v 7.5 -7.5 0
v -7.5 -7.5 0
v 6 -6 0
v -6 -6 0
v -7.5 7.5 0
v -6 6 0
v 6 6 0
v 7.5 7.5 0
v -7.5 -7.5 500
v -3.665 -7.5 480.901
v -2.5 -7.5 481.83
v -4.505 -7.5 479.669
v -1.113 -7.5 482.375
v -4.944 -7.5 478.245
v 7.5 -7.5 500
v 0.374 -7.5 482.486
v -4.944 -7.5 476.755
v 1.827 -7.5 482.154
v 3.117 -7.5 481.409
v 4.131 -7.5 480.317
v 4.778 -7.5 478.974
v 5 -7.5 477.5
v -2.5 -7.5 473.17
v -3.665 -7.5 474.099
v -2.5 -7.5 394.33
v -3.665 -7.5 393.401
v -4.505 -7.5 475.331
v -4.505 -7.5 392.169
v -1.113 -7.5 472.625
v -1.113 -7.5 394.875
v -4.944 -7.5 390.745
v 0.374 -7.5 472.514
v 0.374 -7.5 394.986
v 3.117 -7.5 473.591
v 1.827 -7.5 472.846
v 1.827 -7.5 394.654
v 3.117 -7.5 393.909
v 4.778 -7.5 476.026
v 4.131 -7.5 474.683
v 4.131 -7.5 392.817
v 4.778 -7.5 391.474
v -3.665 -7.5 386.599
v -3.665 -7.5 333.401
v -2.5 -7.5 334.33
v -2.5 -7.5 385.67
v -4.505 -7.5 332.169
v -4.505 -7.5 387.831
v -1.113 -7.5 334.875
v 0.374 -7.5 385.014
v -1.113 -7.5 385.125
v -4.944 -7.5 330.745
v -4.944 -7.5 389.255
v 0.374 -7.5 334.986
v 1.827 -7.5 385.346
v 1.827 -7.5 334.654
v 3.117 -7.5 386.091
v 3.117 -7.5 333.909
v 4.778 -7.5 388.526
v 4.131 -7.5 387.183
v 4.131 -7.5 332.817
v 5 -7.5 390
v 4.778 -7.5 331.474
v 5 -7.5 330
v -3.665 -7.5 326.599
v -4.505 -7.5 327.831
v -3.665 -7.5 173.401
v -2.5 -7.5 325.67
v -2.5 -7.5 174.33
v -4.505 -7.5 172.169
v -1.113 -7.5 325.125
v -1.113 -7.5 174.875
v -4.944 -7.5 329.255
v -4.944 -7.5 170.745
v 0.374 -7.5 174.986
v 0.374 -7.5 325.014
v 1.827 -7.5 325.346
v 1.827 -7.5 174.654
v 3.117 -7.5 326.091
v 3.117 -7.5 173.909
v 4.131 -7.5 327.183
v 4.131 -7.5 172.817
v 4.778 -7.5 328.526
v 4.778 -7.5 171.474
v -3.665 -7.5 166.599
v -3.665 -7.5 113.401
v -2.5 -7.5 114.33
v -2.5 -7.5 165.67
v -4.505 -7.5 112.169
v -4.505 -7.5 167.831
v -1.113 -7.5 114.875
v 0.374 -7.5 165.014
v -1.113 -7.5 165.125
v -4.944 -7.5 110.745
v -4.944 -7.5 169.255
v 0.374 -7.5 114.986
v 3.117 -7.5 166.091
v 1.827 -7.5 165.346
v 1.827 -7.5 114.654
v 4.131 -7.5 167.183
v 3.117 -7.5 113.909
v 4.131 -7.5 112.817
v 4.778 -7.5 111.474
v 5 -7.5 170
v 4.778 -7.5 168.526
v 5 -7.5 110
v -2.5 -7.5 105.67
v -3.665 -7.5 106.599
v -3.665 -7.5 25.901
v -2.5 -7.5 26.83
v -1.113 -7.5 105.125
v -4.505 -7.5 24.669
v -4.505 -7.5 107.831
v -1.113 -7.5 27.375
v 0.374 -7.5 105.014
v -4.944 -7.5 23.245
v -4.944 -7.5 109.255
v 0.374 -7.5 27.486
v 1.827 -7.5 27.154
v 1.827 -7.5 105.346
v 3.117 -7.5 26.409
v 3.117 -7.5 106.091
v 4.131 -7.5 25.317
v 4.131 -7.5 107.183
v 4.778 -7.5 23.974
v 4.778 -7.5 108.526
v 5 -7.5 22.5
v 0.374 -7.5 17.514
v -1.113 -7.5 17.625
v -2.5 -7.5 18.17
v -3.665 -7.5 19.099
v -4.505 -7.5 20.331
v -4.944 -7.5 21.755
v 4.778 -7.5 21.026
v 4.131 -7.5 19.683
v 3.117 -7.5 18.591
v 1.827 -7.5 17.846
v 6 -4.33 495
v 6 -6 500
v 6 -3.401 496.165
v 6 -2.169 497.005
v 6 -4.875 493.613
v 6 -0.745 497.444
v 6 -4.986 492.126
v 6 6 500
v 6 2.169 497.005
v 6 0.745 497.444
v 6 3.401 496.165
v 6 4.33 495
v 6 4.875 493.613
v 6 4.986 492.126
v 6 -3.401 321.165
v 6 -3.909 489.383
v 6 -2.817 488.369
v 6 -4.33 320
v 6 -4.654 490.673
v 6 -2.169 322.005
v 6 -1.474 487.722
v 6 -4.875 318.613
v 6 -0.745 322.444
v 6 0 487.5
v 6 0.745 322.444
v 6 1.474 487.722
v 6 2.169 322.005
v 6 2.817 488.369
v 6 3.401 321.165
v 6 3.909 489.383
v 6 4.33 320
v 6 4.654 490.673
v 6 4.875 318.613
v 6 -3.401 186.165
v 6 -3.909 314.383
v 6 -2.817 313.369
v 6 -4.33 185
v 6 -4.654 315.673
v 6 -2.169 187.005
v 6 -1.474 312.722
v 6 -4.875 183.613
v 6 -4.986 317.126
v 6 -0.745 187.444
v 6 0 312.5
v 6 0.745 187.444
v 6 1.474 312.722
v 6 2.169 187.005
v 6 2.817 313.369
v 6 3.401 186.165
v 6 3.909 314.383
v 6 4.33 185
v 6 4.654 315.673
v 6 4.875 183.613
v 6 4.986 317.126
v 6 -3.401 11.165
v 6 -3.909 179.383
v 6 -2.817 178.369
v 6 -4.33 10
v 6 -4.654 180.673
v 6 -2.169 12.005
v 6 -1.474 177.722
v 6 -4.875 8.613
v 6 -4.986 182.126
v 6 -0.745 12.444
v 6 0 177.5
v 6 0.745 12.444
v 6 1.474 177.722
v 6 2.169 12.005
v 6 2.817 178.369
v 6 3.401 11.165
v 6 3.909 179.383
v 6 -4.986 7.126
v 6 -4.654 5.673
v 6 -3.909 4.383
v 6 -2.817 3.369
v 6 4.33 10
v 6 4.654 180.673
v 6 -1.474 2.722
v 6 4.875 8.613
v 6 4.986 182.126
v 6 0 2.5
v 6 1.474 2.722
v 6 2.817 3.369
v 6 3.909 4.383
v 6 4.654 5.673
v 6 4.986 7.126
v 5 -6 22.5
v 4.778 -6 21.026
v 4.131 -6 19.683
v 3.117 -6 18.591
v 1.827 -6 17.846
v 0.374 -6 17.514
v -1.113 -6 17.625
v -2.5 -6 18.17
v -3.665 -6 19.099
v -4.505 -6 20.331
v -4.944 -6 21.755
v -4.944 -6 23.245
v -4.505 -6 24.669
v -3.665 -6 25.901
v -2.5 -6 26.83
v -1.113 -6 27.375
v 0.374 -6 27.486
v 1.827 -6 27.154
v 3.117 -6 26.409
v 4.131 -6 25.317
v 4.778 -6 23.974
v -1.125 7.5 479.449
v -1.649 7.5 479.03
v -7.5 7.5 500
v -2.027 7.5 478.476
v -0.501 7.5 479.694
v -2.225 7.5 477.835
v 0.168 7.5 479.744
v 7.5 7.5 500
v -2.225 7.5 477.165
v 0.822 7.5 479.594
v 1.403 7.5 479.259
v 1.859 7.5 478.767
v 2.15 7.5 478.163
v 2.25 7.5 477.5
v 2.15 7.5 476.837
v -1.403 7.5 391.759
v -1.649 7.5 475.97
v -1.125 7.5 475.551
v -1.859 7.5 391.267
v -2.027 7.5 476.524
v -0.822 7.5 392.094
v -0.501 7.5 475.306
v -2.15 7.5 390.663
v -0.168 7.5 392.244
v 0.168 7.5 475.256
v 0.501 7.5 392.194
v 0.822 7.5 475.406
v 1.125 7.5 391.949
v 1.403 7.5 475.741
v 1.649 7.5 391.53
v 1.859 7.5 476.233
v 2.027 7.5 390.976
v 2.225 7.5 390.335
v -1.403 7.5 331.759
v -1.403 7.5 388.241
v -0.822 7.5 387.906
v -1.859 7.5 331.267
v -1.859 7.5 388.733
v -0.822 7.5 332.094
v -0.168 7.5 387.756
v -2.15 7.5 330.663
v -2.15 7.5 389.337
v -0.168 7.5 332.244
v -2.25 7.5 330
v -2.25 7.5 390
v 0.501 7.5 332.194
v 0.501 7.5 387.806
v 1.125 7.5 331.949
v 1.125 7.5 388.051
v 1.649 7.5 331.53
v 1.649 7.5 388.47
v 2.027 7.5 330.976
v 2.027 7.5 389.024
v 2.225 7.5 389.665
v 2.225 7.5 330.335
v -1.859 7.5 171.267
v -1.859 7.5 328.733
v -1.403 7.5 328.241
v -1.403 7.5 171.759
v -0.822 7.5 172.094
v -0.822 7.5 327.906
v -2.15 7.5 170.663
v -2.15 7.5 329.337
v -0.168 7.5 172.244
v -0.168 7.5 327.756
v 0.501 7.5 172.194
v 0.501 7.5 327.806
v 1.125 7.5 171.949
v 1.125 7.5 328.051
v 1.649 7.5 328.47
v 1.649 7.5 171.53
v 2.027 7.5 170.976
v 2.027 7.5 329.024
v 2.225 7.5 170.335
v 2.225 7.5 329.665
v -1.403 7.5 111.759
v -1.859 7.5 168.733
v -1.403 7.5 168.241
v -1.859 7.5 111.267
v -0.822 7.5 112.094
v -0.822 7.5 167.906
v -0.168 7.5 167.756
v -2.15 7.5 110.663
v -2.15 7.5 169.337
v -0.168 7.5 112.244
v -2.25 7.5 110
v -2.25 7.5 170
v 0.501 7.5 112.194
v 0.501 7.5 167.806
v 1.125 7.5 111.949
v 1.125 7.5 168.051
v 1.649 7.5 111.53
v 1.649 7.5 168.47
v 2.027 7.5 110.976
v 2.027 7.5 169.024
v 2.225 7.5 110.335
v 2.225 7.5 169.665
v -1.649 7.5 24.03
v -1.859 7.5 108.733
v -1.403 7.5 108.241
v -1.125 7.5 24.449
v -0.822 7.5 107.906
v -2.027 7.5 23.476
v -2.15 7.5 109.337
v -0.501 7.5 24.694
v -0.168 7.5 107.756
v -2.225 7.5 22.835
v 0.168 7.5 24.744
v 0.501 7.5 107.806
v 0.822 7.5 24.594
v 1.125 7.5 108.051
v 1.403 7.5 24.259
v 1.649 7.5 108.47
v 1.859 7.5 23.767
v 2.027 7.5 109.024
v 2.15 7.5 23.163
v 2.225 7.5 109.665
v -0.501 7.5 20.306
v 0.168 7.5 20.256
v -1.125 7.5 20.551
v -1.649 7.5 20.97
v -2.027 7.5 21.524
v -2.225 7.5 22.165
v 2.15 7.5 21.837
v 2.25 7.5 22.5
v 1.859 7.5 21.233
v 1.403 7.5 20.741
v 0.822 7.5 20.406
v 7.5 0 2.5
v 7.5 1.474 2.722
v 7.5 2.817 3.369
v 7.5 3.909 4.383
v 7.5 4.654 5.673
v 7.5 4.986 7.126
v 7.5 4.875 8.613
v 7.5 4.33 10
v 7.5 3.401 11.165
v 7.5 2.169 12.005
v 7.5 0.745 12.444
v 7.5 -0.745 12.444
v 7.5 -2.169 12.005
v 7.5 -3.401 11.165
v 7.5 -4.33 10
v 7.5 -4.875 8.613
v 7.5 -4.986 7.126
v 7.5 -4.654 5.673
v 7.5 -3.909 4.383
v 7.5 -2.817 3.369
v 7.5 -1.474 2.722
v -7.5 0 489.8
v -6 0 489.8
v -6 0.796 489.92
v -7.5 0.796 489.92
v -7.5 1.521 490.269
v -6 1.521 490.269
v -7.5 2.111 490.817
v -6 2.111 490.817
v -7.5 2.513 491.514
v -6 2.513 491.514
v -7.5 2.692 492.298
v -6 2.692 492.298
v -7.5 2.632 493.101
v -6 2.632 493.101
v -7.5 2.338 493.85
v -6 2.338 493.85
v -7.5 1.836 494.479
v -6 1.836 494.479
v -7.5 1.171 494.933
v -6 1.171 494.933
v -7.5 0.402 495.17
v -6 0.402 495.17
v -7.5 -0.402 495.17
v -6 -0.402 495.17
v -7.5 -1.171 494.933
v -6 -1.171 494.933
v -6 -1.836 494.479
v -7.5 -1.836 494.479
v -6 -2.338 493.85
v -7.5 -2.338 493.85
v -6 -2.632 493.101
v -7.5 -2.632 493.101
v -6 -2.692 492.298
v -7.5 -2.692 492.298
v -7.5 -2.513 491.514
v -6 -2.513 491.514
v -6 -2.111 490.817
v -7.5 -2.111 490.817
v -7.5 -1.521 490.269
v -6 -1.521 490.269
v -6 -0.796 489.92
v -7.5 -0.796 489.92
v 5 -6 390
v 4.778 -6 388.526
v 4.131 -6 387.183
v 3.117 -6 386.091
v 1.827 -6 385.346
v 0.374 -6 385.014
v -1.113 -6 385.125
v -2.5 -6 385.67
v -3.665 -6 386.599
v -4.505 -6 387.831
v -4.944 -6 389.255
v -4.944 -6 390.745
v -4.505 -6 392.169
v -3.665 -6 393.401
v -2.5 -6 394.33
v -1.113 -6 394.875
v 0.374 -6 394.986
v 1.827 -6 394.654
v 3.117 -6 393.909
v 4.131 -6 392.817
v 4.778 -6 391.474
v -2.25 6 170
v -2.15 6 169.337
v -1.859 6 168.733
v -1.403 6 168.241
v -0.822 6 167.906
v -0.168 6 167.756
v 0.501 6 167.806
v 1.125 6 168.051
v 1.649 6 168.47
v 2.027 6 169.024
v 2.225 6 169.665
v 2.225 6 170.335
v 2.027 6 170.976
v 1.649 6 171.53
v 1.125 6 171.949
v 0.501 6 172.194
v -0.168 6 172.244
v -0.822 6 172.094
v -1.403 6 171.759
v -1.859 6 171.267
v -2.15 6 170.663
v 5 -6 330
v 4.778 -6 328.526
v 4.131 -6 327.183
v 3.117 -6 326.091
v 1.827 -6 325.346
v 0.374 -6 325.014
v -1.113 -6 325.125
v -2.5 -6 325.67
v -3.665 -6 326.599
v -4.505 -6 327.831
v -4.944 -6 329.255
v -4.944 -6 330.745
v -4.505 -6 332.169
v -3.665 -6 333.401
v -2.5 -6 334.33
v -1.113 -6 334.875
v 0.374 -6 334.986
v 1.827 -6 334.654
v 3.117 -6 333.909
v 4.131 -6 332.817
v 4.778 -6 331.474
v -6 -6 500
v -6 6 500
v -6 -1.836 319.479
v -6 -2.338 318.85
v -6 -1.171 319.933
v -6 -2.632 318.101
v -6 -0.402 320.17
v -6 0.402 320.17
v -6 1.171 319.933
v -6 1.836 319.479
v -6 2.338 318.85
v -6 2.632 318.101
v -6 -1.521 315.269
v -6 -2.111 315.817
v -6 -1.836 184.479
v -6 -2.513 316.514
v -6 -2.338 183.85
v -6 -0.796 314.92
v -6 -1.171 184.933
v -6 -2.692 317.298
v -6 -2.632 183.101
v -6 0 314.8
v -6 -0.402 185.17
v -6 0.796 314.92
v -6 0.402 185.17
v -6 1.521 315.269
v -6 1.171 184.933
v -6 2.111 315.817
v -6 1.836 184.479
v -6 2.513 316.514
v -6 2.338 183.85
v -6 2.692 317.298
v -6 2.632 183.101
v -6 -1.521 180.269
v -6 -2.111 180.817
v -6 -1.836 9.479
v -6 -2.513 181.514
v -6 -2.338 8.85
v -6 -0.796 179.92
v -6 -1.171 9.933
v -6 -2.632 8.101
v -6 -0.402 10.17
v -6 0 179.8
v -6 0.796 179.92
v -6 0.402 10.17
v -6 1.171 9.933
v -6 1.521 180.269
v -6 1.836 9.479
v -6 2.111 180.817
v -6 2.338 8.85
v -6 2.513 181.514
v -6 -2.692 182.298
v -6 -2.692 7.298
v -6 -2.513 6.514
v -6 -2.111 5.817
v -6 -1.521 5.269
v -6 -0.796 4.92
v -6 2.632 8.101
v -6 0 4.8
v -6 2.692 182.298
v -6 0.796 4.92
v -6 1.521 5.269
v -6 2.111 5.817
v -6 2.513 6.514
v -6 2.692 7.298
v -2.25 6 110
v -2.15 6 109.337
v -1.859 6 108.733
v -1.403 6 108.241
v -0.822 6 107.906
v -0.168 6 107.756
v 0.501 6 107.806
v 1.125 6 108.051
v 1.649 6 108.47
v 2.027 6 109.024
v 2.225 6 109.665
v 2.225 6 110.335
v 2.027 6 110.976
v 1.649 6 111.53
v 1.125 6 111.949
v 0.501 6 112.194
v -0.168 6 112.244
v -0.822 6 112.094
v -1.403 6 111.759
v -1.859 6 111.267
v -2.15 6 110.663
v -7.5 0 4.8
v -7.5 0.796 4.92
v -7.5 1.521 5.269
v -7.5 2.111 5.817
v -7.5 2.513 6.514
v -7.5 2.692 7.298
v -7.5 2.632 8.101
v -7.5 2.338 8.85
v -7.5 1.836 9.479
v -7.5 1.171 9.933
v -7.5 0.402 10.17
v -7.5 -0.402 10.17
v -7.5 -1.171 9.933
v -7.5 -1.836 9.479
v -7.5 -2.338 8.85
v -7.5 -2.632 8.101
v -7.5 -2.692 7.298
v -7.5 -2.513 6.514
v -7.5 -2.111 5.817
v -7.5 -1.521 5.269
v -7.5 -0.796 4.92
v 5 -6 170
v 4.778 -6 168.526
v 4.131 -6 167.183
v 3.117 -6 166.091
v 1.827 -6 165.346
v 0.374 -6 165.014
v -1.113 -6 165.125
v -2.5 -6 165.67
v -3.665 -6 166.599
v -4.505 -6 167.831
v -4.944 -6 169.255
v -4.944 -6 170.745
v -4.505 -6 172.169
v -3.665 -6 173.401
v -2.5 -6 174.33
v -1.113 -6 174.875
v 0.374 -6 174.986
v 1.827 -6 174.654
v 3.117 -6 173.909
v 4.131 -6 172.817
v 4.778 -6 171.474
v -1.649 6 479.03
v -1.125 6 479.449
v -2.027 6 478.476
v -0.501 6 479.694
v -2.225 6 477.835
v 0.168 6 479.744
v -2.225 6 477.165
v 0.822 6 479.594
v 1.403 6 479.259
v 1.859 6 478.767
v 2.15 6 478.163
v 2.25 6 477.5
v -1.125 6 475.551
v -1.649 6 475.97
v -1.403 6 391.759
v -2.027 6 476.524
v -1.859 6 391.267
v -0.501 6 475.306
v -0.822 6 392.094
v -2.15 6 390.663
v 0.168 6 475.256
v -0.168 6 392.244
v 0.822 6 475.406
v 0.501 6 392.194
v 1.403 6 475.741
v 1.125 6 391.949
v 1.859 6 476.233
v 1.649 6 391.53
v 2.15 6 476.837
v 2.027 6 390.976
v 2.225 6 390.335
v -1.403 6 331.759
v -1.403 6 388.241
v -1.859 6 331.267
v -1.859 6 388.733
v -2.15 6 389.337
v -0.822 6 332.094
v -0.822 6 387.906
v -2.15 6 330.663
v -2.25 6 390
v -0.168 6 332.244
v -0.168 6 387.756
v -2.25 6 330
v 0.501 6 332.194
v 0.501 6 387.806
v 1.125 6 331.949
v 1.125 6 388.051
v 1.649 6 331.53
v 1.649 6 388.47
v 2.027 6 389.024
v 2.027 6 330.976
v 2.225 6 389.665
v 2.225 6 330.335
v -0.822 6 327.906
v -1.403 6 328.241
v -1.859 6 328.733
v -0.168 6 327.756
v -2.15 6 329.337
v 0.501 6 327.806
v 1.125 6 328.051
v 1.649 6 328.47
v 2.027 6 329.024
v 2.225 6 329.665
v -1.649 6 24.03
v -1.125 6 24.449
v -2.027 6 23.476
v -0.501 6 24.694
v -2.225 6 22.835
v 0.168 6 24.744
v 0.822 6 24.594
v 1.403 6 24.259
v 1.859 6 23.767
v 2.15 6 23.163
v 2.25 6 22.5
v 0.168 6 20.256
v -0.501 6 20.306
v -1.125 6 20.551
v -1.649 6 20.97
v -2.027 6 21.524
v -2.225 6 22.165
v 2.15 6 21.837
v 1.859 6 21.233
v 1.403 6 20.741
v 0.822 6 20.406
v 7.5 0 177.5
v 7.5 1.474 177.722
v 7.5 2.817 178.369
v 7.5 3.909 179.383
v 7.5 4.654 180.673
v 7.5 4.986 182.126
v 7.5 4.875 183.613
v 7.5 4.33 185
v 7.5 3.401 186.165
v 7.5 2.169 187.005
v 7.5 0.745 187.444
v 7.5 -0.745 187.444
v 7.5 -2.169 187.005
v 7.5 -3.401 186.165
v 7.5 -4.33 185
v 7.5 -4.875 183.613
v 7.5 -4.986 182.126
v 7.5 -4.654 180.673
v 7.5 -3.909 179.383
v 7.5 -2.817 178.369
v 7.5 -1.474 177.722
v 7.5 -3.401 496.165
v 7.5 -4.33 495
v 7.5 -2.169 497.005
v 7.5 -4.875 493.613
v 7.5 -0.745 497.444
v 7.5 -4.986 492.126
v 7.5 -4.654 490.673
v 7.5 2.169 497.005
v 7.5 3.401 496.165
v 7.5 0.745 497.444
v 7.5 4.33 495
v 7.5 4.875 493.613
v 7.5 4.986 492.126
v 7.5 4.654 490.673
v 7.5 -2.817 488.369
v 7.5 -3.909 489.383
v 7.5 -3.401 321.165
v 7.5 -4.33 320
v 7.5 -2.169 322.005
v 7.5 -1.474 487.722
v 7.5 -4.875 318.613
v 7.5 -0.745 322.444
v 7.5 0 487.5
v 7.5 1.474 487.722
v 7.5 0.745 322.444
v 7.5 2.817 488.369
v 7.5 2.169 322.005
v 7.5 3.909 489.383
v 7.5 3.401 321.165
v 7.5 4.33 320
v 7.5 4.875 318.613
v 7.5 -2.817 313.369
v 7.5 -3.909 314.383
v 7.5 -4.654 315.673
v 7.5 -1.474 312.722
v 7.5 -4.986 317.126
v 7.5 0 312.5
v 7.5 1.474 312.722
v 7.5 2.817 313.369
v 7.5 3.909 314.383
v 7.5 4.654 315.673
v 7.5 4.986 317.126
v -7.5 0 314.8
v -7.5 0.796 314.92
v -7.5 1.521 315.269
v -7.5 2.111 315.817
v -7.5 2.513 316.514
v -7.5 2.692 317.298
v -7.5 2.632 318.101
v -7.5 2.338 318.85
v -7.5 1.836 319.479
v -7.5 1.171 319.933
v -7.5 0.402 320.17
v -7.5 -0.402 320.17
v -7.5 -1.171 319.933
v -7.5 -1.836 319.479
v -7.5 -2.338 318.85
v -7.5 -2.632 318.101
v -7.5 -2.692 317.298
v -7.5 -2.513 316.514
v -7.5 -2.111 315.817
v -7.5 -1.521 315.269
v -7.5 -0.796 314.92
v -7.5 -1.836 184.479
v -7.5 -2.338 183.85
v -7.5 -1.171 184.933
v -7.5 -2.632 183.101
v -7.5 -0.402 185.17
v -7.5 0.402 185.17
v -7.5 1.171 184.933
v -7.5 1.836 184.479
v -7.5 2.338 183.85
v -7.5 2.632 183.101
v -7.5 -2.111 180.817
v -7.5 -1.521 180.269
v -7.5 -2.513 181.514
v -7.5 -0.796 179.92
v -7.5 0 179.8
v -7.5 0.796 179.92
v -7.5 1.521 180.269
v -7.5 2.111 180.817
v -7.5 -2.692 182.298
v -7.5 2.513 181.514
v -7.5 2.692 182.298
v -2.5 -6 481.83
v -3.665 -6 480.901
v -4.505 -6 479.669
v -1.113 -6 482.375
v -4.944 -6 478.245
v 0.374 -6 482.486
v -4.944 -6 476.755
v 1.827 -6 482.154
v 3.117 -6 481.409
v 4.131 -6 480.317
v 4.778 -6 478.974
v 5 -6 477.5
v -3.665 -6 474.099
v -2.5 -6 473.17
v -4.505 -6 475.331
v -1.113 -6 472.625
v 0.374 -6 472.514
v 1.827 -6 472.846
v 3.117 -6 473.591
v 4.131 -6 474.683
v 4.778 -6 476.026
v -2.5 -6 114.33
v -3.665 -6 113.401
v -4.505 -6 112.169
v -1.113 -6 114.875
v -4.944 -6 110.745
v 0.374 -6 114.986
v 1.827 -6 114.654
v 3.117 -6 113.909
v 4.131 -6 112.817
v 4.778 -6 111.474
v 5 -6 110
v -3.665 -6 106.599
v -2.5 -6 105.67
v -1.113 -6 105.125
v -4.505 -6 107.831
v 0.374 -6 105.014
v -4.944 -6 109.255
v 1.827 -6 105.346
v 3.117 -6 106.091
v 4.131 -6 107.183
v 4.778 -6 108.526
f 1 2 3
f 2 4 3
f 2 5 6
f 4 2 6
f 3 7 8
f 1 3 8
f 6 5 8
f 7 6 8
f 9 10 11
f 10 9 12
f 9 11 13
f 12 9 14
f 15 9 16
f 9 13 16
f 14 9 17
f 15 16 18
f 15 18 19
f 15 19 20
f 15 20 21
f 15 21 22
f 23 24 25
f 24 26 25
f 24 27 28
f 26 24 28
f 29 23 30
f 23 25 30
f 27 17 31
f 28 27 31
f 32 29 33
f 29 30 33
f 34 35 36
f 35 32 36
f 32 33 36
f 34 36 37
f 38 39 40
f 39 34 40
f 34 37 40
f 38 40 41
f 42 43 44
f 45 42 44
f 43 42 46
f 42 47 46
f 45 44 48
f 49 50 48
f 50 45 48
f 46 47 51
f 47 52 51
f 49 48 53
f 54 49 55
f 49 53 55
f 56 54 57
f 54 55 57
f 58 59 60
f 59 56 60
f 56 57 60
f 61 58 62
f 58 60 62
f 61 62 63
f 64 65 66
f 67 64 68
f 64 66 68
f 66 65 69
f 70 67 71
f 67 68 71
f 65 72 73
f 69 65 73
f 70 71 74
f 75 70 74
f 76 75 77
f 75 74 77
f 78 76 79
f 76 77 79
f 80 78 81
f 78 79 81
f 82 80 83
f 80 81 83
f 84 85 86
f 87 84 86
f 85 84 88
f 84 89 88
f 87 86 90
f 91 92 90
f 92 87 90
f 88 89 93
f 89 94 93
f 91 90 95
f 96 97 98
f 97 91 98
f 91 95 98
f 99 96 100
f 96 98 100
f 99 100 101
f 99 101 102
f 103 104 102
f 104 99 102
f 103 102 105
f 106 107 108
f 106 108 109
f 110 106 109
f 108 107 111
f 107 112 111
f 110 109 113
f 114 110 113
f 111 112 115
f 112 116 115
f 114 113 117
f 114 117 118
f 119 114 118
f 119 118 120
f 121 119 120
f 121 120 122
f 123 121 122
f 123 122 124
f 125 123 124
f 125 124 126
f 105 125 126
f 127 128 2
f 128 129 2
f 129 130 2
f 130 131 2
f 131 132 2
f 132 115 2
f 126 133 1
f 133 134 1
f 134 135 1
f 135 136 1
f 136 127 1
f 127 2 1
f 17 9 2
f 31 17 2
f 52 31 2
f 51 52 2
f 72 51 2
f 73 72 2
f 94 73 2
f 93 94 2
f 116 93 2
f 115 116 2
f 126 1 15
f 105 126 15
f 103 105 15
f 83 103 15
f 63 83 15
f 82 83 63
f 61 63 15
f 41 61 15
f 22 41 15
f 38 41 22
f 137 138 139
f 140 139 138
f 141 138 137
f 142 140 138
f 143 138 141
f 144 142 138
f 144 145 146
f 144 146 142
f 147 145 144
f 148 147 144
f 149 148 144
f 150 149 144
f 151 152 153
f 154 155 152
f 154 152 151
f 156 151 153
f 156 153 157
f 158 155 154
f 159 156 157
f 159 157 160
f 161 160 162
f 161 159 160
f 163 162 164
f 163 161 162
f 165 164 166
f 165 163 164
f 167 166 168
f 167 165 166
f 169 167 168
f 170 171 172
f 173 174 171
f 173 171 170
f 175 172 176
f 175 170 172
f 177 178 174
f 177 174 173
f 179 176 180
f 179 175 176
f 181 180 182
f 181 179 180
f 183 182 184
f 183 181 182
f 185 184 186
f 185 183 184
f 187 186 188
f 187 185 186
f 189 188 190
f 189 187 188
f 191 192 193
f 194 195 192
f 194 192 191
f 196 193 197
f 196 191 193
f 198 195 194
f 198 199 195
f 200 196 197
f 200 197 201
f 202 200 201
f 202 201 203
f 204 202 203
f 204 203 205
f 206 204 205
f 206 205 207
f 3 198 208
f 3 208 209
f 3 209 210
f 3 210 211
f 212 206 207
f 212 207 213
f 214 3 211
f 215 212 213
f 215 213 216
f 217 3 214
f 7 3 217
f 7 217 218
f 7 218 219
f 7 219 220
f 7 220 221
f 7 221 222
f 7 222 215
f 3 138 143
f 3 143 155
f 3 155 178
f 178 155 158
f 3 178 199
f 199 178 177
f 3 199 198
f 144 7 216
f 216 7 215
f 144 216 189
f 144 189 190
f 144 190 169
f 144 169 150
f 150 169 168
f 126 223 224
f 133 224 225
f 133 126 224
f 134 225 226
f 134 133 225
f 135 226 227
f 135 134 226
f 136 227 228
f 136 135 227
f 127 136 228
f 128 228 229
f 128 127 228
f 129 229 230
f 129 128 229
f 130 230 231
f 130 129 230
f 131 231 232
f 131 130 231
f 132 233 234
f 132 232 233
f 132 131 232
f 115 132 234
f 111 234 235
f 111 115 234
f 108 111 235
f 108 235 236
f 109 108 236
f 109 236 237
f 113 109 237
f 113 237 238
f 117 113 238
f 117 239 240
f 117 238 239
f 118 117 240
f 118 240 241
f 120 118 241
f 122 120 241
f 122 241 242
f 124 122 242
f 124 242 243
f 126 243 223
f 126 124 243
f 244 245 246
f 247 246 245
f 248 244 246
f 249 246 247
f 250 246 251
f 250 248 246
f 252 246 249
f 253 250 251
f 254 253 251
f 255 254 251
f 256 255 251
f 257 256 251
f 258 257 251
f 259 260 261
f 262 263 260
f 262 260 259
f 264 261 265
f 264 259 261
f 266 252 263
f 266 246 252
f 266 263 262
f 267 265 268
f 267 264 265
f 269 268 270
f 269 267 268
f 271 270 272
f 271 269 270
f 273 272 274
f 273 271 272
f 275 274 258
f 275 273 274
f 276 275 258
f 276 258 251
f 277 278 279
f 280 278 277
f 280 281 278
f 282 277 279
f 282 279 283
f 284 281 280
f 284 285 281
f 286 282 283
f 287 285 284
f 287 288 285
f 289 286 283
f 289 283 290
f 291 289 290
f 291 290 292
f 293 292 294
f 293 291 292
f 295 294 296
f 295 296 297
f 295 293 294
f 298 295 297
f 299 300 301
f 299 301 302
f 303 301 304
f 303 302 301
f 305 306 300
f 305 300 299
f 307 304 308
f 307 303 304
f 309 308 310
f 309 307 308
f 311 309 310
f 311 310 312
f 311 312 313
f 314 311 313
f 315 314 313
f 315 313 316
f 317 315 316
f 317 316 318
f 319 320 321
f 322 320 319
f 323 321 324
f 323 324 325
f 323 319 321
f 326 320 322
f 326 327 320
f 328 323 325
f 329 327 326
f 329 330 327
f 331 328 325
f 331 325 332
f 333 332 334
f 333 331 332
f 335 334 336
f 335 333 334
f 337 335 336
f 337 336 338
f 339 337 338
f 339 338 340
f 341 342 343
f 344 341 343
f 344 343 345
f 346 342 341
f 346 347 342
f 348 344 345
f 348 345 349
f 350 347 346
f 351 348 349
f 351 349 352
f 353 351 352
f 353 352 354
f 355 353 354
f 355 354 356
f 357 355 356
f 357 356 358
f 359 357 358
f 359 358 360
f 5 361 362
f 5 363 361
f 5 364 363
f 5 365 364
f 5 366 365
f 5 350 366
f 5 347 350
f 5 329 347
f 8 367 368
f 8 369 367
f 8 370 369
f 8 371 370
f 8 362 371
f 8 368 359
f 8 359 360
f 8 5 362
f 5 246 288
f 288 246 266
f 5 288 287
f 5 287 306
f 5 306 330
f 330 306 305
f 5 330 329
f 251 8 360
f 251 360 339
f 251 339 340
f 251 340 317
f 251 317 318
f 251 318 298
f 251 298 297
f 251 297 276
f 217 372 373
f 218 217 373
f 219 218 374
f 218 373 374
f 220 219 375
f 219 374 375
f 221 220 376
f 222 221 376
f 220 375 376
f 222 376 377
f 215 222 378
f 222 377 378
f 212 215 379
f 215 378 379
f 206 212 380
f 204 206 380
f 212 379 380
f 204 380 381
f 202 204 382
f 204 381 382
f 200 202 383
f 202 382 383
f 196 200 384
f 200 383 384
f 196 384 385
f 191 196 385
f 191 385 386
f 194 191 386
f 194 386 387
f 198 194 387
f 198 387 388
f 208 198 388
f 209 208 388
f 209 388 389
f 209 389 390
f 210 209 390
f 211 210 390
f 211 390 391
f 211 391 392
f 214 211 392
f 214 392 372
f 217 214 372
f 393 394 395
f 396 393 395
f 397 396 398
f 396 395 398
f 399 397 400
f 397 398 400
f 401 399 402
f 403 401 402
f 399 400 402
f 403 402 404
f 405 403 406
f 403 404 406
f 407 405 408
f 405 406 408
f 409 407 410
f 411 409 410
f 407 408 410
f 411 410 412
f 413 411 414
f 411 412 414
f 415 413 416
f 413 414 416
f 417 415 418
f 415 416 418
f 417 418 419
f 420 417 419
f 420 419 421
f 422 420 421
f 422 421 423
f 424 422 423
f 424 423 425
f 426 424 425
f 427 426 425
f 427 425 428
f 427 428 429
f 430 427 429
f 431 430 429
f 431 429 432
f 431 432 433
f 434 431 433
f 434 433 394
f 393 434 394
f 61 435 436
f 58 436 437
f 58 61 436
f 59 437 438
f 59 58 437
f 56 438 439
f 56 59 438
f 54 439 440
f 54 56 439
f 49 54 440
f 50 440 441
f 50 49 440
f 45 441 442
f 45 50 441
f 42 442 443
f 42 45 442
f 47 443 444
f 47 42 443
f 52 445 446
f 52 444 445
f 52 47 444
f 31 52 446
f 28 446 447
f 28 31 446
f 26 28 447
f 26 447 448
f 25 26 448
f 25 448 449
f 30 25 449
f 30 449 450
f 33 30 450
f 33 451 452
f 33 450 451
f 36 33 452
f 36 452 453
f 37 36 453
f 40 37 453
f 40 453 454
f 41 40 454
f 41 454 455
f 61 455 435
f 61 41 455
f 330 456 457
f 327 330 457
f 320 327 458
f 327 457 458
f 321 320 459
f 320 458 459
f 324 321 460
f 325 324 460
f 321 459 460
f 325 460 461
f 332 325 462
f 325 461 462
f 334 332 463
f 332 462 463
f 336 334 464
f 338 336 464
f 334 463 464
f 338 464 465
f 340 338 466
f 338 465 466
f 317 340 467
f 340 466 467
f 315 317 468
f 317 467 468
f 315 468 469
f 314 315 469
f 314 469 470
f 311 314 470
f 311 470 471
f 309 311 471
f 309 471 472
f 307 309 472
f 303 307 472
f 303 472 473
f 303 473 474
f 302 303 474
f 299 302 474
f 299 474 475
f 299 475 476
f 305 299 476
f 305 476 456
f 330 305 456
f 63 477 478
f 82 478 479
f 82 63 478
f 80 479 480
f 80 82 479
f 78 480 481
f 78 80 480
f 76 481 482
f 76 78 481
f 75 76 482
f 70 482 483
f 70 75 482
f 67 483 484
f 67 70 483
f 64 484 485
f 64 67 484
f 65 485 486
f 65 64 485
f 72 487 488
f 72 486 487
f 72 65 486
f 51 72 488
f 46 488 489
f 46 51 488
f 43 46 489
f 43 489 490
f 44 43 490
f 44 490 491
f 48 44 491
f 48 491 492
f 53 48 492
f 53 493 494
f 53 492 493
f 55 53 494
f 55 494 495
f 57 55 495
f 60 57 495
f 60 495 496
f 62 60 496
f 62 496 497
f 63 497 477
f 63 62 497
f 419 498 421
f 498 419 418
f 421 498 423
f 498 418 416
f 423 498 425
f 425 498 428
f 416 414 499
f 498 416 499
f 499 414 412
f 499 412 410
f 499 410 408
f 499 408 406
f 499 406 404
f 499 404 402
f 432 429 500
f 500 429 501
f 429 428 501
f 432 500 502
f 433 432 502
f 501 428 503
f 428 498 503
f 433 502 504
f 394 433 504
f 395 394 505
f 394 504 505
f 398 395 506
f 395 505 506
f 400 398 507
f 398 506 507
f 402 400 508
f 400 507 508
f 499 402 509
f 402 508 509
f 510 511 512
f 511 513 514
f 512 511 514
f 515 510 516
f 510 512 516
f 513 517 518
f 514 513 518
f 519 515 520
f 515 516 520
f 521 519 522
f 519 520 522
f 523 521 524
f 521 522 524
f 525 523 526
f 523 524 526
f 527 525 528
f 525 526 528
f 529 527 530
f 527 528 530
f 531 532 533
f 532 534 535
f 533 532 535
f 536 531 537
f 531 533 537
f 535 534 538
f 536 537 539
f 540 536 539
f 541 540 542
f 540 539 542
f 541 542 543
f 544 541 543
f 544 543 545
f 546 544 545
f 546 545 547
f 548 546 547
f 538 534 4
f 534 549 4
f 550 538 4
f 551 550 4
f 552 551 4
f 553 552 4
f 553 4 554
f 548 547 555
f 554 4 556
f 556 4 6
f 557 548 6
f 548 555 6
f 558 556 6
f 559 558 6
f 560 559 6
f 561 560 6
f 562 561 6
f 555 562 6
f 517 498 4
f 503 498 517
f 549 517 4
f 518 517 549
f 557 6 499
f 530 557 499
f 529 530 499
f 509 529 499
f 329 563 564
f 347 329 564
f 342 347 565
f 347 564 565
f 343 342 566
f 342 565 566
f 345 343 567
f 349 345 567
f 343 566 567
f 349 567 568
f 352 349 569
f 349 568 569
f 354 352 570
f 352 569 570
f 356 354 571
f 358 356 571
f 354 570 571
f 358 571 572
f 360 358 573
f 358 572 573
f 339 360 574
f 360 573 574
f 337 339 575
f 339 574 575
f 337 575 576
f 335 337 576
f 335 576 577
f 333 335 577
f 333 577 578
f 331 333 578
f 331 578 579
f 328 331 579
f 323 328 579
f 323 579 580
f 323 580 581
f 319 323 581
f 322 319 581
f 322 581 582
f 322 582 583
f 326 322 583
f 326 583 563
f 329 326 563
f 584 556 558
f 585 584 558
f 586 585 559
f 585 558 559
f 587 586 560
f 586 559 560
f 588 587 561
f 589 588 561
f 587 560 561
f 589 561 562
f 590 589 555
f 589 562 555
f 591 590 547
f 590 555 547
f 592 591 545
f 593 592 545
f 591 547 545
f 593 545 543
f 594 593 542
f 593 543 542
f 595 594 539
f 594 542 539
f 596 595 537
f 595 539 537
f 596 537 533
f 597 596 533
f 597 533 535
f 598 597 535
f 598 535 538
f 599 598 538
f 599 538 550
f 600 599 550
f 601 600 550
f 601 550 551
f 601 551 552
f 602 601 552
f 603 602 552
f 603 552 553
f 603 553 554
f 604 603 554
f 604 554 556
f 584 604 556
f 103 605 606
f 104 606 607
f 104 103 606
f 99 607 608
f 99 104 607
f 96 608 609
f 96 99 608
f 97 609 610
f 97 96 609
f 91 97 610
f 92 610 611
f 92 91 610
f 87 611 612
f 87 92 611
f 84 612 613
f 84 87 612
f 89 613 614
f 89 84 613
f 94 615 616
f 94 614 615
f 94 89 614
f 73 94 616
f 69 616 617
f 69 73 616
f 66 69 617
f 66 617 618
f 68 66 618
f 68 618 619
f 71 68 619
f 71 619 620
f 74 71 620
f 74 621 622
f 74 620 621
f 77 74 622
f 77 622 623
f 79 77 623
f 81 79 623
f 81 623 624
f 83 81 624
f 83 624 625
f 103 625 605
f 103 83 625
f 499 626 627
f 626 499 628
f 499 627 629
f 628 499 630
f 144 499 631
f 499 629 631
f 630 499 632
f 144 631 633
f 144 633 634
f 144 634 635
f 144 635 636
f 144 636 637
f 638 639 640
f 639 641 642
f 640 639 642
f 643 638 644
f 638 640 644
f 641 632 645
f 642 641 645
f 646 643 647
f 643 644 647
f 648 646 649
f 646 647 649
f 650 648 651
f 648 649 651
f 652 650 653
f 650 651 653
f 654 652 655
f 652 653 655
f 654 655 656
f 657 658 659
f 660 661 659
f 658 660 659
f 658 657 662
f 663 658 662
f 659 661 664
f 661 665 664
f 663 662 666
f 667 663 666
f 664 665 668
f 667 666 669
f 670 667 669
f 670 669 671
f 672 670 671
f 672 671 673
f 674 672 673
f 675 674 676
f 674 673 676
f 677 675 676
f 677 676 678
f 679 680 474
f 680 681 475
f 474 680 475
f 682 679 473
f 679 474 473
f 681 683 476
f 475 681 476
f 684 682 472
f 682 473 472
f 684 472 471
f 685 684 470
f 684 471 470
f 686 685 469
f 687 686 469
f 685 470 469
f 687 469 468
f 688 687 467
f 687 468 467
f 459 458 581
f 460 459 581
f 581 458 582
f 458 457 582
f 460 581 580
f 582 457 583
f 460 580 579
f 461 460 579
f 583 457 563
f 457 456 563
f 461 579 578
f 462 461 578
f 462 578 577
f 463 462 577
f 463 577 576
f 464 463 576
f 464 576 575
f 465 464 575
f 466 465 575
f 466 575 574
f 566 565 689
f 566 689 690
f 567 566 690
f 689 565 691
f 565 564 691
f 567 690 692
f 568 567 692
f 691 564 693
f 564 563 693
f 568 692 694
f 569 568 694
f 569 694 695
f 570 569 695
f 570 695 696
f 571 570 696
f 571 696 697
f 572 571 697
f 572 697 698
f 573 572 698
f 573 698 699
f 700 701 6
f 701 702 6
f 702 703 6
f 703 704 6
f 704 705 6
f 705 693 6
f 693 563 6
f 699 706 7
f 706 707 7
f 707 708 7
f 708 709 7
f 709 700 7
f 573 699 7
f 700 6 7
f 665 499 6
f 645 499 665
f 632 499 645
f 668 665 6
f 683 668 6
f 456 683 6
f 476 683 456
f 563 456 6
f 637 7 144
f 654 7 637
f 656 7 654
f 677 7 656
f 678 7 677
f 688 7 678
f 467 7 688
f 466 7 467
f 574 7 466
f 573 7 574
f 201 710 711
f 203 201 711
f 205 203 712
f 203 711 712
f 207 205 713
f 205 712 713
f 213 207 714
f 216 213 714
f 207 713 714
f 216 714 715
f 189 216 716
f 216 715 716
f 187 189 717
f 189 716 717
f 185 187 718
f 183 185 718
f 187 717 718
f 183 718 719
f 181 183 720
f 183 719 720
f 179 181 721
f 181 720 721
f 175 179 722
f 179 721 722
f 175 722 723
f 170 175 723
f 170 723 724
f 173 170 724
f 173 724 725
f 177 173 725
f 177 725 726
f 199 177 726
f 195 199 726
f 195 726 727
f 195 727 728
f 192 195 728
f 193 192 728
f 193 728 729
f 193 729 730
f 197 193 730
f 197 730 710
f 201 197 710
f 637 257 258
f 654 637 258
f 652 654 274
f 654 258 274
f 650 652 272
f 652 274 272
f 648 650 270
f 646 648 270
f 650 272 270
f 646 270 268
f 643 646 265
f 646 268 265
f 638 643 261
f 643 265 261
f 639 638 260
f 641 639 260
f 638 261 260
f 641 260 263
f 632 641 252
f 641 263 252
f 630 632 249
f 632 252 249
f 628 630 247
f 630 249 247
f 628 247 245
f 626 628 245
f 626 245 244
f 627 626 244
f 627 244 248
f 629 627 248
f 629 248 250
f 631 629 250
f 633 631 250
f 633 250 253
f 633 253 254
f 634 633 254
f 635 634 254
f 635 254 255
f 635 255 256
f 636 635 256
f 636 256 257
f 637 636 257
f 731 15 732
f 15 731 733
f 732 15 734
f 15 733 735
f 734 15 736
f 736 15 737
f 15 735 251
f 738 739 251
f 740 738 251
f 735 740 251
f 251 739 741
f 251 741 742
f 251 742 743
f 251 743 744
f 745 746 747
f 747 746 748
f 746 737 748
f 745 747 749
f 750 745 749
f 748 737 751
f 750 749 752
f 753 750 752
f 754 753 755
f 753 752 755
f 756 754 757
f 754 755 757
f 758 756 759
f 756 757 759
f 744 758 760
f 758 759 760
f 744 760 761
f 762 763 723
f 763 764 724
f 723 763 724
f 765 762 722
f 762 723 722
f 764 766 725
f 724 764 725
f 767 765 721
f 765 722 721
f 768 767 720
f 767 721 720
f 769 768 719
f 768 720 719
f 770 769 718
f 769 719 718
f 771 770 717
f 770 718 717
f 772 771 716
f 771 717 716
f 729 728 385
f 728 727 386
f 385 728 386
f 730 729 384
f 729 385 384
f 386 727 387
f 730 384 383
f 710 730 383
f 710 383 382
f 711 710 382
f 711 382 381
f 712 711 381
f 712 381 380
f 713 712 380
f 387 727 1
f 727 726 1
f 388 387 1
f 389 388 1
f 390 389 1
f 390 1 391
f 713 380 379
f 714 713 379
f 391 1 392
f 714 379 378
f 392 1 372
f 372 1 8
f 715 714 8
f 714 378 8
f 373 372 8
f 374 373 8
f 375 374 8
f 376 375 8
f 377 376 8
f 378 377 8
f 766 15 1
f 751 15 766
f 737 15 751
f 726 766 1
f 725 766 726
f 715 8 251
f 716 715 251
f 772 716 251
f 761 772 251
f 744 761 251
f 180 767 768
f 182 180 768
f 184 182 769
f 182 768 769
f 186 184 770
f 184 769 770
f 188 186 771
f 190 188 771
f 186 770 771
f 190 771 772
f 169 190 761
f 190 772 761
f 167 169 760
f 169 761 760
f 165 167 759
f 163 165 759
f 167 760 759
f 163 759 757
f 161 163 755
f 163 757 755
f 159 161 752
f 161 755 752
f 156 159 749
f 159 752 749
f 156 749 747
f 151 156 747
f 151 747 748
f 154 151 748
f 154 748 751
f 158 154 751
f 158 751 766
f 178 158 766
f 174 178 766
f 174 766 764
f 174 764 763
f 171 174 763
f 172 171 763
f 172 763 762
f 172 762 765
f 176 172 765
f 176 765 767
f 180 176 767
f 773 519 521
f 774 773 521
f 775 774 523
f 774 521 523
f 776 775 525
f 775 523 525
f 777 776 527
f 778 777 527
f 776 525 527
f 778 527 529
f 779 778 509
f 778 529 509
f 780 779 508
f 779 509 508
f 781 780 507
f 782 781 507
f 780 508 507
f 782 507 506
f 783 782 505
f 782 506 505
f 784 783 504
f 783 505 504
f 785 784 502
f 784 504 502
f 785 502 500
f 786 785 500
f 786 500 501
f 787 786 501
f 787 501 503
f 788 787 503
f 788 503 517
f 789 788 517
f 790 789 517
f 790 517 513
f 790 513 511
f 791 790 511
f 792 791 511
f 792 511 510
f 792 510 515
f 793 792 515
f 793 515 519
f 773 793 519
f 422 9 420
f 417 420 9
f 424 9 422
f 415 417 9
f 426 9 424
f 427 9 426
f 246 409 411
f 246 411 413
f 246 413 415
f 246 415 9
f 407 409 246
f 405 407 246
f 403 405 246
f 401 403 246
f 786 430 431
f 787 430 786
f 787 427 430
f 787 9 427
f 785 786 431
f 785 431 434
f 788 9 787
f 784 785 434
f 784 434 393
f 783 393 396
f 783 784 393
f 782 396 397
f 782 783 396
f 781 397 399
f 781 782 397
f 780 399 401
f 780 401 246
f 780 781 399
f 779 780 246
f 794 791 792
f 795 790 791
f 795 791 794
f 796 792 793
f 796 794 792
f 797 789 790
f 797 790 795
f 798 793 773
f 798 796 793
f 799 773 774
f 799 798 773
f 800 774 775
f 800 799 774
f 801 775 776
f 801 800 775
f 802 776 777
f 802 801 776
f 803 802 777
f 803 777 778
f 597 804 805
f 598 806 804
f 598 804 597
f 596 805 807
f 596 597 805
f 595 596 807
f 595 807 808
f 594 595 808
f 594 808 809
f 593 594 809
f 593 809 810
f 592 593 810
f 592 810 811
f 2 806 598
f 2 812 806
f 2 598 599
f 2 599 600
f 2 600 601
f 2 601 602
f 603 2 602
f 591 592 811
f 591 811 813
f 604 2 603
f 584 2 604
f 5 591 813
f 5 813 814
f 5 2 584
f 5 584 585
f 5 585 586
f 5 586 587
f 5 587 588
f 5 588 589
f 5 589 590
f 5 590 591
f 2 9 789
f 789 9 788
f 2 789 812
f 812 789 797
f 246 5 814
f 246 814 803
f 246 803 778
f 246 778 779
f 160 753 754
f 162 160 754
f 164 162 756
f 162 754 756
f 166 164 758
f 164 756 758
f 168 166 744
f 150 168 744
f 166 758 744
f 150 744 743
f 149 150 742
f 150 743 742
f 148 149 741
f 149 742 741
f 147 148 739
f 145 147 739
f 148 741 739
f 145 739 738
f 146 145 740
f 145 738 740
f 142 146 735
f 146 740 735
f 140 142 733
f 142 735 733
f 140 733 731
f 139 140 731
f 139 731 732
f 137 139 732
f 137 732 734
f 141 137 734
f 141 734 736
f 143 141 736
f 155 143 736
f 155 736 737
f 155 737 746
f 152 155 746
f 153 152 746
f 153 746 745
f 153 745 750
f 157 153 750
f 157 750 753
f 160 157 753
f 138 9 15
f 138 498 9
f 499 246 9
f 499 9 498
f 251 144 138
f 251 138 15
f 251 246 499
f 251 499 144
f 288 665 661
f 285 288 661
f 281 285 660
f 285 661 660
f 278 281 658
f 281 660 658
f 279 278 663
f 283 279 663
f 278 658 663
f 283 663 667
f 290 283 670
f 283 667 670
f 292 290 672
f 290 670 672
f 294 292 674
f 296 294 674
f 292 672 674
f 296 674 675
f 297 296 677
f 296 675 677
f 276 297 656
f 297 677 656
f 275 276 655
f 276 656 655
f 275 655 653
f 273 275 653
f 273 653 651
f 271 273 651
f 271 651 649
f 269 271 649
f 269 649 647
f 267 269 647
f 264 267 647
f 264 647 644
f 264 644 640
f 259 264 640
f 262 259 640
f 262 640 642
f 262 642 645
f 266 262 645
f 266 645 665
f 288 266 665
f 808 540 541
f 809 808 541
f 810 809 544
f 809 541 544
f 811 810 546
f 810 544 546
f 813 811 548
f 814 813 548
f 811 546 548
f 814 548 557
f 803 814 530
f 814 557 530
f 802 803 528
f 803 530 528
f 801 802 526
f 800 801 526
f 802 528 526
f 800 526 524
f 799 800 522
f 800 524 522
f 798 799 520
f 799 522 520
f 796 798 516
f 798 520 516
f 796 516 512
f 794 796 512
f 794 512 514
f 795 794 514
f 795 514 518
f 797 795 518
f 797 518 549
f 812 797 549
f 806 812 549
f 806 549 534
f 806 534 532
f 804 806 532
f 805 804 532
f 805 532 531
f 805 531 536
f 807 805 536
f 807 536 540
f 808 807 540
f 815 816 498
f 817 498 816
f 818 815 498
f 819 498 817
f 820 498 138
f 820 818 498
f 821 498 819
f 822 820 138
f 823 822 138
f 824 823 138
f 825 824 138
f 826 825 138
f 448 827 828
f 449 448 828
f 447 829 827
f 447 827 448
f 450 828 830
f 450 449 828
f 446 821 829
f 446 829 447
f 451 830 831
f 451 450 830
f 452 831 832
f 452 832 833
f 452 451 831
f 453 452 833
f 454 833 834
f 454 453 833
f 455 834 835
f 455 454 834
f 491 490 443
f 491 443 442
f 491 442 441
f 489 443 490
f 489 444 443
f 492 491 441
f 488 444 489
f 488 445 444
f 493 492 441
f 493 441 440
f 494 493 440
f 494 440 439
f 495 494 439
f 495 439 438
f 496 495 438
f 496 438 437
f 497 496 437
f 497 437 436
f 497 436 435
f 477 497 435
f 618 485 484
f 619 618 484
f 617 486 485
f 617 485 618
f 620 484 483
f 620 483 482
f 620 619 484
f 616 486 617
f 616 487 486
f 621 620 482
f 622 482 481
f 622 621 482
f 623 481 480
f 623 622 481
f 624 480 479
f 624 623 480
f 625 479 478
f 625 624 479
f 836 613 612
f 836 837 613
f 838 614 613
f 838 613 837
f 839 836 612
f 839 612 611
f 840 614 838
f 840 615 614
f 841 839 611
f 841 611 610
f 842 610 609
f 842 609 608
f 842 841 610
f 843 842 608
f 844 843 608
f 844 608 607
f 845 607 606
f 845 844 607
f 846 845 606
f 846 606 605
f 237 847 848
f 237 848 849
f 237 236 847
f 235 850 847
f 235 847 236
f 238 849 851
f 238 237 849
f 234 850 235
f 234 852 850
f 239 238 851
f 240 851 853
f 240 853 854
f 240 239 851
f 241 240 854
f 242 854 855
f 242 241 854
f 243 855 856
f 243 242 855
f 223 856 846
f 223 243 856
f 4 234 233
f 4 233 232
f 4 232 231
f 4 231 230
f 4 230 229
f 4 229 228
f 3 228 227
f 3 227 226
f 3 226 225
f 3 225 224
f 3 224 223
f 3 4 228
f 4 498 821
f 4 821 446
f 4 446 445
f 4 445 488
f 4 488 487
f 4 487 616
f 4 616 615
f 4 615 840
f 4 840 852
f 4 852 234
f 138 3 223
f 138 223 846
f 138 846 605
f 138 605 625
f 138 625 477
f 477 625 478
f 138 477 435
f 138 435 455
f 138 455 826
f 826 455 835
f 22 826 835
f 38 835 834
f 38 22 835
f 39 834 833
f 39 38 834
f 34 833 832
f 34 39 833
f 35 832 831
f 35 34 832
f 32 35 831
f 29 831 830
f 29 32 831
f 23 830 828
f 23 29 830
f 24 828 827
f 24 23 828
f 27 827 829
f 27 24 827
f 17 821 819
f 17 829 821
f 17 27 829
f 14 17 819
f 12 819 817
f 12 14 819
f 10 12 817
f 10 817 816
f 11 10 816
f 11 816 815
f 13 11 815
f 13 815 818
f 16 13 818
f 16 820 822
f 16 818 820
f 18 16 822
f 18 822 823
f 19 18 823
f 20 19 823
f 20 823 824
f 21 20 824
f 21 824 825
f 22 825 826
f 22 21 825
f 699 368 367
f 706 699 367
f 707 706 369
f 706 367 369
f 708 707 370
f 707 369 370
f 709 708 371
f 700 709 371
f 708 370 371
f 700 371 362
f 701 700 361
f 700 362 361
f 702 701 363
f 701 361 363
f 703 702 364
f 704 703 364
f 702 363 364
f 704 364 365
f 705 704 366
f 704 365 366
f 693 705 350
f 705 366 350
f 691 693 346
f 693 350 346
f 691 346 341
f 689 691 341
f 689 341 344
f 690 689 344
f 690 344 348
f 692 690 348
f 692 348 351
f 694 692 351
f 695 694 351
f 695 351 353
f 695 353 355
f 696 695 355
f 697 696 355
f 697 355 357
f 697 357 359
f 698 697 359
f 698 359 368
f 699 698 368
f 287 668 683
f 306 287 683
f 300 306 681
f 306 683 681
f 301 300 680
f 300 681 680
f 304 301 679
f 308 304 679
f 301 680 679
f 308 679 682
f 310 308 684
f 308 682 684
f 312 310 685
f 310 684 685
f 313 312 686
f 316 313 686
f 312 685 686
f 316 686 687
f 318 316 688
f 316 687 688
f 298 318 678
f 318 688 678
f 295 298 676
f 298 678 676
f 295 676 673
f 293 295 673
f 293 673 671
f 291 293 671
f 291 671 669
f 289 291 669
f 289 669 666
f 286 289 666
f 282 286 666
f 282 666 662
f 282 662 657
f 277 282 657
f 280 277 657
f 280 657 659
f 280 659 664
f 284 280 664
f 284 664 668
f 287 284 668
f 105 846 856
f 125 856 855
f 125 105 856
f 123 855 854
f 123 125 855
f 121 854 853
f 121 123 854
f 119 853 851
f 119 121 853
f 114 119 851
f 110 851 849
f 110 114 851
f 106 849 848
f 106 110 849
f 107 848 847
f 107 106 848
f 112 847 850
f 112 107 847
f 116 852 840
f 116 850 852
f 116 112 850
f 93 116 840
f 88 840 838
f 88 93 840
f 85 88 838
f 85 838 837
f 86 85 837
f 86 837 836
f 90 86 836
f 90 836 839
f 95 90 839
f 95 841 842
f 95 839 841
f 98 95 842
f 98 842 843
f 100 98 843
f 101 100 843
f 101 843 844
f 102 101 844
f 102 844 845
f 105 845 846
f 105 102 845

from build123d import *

# Parameters (mm, degrees)
SKETCH_1_W          = 15
SKETCH_1_H          = 15
SKETCH_1_W_2        = 12
SKETCH_1_H_2        = 12
EXTRUDE_1_DEPTH     = 500
SKETCH_2_R          = 2.7
CUT_EXTRUDE_1_DEPTH = 25
SKETCH_3_R          = 2.25
CUT_EXTRUDE_2_DEPTH = 25
SKETCH_4_R          = 2.25
CUT_EXTRUDE_3_DEPTH = 20
SKETCH_5_R          = 5
CUT_EXTRUDE_4_DEPTH = 10
SKETCH_6_R          = 5
CUT_EXTRUDE_5_DEPTH = 10


with BuildPart() as part:
    # ｽｹｯﾁ1 → ﾎﾞｽ - 押し出し1 (new body)
    with BuildSketch(Plane.XY):
        Rectangle(SKETCH_1_W, SKETCH_1_H)
        Rectangle(SKETCH_1_W_2, SKETCH_1_H_2, mode=Mode.SUBTRACT)
    extrude(amount=EXTRUDE_1_DEPTH)

    # ｽｹｯﾁ2 → ｶｯﾄ - 押し出し1 (cut)
    with BuildSketch(Plane(origin=(7.5, 0, 0), x_dir=(0, 0, -1), z_dir=(1, 0, 0))):
        with Locations((-492.5, 0)):
            Circle(SKETCH_2_R)
        with Locations((-7.5, 0)):
            Circle(SKETCH_2_R)
        with Locations((-317.5, 0)):
            Circle(SKETCH_2_R)
        with Locations((-182.5, 0)):
            Circle(SKETCH_2_R)
    extrude(amount=-CUT_EXTRUDE_1_DEPTH, mode=Mode.SUBTRACT)

    # ｽｹｯﾁ3 → ｶｯﾄ - 押し出し2 (cut)
    with BuildSketch(Plane(origin=(0, 7.5, 0), x_dir=(1, 0, 0), z_dir=(0, 1, 0))):
        with Locations((0, -22.5)):
            Circle(SKETCH_3_R)
        with Locations((0, -477.5)):
            Circle(SKETCH_3_R)
    extrude(amount=-CUT_EXTRUDE_2_DEPTH, mode=Mode.SUBTRACT)

    # ｽｹｯﾁ4 → ｶｯﾄ - 押し出し3 (cut)
    with BuildSketch(Plane(origin=(0, -7.5, 0), x_dir=(-1, 0, 0), z_dir=(0, -1, 0))):
        with Locations((0, -390)):
            Circle(SKETCH_4_R)
        with Locations((0, -330)):
            Circle(SKETCH_4_R)
        with Locations((0, -110)):
            Circle(SKETCH_4_R)
        with Locations((0, -170)):
            Circle(SKETCH_4_R)
    extrude(amount=-CUT_EXTRUDE_3_DEPTH, mode=Mode.SUBTRACT)

    # ｽｹｯﾁ5 → ｶｯﾄ - 押し出し4 (cut)
    with BuildSketch(Plane(origin=(0, -7.5, 0), x_dir=(1, 0, 0), z_dir=(0, 1, 0))):
        with Locations((0, -22.5)):
            Circle(SKETCH_5_R)
        with Locations((0, -477.5)):
            Circle(SKETCH_5_R)
        with Locations((0, -390)):
            Circle(SKETCH_5_R)
        with Locations((0, -330)):
            Circle(SKETCH_5_R)
        with Locations((0, -110)):
            Circle(SKETCH_5_R)
        with Locations((0, -170)):
            Circle(SKETCH_5_R)
    extrude(amount=CUT_EXTRUDE_4_DEPTH, mode=Mode.SUBTRACT)

    # ｽｹｯﾁ6 → ｶｯﾄ - 押し出し5 (cut)
    with BuildSketch(Plane(origin=(7.5, 0, 0), x_dir=(0, 0, -1), z_dir=(1, 0, 0))):
        with Locations((-492.5, 0)):
            Circle(SKETCH_6_R)
        with Locations((-317.5, 0)):
            Circle(SKETCH_6_R)
        with Locations((-182.5, 0)):
            Circle(SKETCH_6_R)
        with Locations((-7.5, 0)):
            Circle(SKETCH_6_R)
    extrude(amount=-CUT_EXTRUDE_5_DEPTH, mode=Mode.SUBTRACT)


solid = part.part
